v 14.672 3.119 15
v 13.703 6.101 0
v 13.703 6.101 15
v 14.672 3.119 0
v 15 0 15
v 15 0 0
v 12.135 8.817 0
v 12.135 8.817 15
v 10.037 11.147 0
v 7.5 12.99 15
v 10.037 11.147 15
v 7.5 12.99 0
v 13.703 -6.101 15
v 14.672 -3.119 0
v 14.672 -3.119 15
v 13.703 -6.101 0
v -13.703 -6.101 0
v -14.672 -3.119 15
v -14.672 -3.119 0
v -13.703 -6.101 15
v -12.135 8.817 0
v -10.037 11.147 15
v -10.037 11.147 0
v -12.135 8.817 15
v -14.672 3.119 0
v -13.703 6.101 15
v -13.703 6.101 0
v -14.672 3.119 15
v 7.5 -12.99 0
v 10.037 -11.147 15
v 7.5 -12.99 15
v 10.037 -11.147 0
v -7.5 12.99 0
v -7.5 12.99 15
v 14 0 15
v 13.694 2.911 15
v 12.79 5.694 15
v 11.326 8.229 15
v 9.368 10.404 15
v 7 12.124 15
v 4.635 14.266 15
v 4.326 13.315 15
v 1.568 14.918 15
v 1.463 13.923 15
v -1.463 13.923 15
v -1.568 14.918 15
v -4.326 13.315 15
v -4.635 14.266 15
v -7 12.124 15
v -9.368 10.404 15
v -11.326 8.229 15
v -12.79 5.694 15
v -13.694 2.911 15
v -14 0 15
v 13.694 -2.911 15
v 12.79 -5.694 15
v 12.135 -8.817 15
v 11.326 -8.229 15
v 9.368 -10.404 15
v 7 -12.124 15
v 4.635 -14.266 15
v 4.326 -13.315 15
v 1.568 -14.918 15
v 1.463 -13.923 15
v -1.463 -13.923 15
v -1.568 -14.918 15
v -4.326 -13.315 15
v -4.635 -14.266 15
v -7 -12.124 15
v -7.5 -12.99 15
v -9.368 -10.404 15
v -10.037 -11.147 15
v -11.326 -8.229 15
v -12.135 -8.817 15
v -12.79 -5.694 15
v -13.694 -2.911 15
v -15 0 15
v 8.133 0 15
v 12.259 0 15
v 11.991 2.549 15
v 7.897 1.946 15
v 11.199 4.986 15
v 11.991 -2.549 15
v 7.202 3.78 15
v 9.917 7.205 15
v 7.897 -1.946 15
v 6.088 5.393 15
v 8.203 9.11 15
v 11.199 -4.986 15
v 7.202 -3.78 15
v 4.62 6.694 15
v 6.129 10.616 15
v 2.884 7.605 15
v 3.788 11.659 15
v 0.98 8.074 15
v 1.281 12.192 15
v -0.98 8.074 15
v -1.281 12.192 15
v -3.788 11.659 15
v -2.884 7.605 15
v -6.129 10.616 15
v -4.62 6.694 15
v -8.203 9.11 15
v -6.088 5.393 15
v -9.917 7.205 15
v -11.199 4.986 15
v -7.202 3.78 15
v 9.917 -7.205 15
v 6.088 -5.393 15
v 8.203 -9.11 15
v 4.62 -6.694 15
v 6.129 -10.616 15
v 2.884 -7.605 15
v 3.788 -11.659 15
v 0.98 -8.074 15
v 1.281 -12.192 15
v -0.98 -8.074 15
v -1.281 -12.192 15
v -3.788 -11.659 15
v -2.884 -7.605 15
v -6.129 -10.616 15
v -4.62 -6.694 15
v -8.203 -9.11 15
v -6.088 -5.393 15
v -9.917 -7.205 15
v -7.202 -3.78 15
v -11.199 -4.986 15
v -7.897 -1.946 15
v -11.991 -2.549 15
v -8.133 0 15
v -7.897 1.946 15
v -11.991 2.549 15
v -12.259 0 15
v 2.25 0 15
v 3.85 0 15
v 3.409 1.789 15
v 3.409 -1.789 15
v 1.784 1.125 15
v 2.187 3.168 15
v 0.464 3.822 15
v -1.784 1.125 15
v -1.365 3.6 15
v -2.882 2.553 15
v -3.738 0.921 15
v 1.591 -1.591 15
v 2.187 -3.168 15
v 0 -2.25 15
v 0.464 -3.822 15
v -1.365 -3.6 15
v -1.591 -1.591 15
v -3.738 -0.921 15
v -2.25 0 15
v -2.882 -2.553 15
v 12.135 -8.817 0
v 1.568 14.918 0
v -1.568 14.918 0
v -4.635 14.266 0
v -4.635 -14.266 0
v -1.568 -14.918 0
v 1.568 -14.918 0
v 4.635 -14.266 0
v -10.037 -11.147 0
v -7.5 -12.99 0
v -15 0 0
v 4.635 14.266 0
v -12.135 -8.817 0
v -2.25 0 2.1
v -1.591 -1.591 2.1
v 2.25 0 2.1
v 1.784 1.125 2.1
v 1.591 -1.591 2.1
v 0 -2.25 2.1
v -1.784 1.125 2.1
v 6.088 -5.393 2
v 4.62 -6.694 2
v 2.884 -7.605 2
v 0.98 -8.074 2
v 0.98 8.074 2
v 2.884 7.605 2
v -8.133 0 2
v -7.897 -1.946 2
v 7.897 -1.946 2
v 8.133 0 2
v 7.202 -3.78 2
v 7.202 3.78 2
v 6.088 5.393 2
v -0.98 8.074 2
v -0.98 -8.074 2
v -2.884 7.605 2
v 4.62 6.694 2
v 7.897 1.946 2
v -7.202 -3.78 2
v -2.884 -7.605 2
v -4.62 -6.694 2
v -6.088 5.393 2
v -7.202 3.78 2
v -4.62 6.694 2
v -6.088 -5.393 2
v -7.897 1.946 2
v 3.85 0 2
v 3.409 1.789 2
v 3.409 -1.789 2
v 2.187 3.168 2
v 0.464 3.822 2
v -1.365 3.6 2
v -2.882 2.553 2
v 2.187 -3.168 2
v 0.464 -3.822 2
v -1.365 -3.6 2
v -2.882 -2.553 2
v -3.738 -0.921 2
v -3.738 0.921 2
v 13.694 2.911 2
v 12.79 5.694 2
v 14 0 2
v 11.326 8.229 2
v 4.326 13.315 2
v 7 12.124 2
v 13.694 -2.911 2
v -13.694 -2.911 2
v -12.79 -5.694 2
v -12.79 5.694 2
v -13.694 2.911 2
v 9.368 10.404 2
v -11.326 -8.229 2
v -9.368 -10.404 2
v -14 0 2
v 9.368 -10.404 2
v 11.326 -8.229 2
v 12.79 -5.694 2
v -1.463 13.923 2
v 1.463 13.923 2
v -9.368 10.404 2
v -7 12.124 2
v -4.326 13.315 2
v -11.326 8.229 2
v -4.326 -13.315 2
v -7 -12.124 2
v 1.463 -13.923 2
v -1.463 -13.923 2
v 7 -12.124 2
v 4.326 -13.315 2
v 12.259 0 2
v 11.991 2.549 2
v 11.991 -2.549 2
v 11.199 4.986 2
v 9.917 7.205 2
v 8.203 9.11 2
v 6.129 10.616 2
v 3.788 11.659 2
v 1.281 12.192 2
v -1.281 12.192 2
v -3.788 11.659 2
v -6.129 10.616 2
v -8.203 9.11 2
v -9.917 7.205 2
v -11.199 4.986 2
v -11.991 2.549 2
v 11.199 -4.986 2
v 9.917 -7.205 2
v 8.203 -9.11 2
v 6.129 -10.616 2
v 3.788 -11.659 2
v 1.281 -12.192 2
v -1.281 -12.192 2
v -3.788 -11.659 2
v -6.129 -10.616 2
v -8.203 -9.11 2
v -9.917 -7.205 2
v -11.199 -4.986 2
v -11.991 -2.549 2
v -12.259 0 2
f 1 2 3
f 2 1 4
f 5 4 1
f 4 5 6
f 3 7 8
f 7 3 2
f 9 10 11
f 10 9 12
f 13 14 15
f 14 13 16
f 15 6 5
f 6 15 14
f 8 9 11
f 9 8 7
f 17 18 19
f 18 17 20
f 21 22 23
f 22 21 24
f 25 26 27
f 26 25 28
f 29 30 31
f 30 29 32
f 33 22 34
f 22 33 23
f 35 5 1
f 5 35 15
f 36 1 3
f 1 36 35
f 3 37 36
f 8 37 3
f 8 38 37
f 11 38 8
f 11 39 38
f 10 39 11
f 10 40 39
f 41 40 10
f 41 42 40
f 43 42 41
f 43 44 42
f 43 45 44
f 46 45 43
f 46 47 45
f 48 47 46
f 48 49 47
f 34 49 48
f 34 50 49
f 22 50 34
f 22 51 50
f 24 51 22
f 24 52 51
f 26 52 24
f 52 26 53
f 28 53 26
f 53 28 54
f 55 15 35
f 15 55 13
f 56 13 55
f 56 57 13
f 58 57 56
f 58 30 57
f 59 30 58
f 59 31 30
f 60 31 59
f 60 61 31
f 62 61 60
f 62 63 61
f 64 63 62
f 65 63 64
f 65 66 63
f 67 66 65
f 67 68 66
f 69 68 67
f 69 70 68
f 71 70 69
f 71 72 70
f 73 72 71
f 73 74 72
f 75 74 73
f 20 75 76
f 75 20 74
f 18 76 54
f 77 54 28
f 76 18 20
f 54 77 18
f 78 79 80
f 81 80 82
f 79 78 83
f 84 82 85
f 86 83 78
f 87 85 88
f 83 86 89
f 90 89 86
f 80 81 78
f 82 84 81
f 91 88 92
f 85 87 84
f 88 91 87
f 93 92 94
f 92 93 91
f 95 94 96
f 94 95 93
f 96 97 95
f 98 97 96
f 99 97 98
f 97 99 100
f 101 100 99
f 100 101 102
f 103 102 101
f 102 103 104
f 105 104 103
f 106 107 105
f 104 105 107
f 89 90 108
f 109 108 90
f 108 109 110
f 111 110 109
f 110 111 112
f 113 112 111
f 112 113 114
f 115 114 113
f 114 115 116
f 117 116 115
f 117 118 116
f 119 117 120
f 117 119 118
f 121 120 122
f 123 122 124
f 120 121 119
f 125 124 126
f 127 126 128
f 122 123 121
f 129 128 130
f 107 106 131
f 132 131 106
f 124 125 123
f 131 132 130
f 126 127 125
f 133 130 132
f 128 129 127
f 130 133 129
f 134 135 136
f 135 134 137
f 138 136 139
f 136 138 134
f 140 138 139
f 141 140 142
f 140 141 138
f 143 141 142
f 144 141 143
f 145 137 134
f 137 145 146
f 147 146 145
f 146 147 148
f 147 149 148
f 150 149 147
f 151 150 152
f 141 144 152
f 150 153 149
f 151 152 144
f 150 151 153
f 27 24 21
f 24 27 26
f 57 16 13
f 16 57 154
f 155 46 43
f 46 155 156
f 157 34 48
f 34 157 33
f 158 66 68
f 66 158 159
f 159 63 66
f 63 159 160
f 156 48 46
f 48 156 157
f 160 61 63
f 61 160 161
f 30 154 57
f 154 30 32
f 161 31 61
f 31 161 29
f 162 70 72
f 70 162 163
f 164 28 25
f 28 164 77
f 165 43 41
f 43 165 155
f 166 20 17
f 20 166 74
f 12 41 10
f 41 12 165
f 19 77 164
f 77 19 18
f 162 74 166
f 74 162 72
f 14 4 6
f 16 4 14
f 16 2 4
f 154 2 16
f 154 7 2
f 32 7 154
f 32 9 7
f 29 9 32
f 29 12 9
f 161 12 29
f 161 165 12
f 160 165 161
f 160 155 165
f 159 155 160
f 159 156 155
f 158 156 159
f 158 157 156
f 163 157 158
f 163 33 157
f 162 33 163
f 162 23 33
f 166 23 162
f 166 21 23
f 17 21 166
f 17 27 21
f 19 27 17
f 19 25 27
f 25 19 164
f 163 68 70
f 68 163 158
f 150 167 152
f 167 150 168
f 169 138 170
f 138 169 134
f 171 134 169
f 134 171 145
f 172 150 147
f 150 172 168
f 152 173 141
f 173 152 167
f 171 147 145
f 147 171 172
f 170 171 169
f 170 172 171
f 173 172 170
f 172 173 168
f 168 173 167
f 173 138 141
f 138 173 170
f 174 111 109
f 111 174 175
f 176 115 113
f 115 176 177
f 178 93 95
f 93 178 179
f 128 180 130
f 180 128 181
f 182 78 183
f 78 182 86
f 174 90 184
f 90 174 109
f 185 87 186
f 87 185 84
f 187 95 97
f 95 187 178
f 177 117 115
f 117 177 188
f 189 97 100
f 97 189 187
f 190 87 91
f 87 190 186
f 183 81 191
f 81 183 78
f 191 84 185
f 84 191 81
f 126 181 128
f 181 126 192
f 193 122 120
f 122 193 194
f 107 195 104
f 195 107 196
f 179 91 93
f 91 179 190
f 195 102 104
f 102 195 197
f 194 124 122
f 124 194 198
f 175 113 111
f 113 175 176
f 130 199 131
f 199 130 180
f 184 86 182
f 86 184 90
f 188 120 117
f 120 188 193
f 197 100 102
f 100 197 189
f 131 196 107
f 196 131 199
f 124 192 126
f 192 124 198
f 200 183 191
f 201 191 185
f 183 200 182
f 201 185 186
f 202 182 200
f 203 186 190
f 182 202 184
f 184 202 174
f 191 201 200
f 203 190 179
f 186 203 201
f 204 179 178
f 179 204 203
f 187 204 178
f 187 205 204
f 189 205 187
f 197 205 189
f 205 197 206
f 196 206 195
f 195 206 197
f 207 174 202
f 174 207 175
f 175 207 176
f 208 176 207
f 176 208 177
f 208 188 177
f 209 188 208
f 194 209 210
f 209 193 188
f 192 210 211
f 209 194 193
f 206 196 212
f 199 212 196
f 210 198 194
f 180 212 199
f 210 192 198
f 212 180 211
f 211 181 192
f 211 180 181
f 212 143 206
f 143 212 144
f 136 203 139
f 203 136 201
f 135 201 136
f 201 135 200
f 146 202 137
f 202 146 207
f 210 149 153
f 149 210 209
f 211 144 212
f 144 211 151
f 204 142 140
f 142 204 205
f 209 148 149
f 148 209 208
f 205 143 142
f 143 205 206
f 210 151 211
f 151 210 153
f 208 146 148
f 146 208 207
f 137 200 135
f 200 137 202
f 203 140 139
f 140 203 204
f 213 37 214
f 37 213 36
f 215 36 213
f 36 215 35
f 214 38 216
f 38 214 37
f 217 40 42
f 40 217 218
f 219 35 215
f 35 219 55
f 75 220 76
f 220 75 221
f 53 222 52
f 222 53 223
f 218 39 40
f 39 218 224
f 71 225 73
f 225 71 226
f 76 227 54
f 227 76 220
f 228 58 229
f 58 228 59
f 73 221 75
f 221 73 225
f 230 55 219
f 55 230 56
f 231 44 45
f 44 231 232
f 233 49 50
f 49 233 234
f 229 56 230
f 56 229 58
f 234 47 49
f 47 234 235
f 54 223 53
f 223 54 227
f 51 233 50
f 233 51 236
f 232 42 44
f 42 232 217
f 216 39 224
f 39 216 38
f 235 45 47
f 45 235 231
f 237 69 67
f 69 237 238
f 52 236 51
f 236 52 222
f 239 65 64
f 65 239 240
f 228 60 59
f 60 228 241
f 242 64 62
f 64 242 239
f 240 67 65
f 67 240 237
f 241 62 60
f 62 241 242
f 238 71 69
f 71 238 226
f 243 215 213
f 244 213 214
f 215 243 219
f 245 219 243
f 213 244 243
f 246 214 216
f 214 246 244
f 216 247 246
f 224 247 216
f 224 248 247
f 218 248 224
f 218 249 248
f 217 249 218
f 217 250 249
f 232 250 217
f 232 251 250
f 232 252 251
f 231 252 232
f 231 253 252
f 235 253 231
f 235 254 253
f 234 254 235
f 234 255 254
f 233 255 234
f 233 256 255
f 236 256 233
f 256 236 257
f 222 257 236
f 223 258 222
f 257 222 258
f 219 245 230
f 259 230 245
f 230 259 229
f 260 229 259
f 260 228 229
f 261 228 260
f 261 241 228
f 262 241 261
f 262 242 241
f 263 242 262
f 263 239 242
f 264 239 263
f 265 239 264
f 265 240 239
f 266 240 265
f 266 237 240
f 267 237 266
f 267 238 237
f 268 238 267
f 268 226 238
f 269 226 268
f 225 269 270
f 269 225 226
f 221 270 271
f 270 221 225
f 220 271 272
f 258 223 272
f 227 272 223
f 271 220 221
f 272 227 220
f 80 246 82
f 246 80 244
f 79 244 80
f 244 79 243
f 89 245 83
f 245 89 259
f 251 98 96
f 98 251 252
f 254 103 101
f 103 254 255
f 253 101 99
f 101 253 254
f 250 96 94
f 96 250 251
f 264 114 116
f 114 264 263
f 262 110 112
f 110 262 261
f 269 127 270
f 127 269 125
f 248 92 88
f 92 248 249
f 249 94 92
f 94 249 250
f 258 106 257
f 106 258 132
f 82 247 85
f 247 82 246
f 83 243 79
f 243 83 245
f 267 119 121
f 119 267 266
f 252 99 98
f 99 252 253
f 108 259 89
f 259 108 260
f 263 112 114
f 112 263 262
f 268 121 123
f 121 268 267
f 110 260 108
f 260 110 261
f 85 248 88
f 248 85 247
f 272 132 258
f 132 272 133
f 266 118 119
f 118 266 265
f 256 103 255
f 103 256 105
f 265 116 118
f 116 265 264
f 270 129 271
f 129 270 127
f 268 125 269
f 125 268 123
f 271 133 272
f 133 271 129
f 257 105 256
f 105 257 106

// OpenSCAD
e = 0.1; // epsilon

// Screws / Nuts
// described by a 5-Element vector, offsets defined as follows
nut_diameter       = 0;
nut_height         = 1;
screw_channel      = 2;
screw_head_channel = 3;
screw_head_height  = 4;
m3 = [6.5, 2.5, 3.5, 6.0, 2.5];
m4 = [8.0, 3.5, 4.5, 7.5, 3.0];

// Nut embedding:
//
// dw: nut_diameter
// rw: nut radius
//                         +--+
//                         |  |
//                         |  |
//   X---------------------A  |-------
//                         |  |
//                         |  | rw
//                         B--C
//                         wh
// X: center of circle
// We want at least 1mm between nut and outer diameter, x
// We want the radius of the outer circle ro
// z = XB, ri = XA (inner radius), wh = BC (nut height)
// we have
// z² = (ri)² + (rw)²
// and approx.
// x = ro - z - wh
// solving for ro we get:
// ro = x + z + wh = x + sqrt (ri² + rw²) + wh
//

module knob_hollow (r1, r2, r3, r4, height, lift)
{
    translate ([0, 0, lift])
    {
        difference () {
            cylinder (h = height, r = r2);
            translate ([0, 0, -e])
                cylinder (h = height + 2 * e, r = r1);
        }
        if (r4 - r3 > 1) {
            difference () {
                cylinder (h = height, r = r4);
                translate ([0, 0, -e])
                    cylinder (h = height + 2 * e, r = r3);
            }
        }
    }
}

//module screw_hole ()
//{
//}

module knob_body (knob_dia, axis_dia, axis_carve, conic, depth, top)
{
    kr  = knob_dia / 2;
    ar  = axis_dia / 2;
    union () {
        difference () {
            cylinder (h = depth, r = kr);
            translate ([0, 0, top + e])
                cylinder (h = depth - top, r = ar);
        }
        translate ([0, (1-axis_carve) * axis_dia, depth / 2])
            cube ([axis_dia, axis_dia, depth], center = true);
    }
}

module knob (knob_dia, axis_dia, axis_carve, conic, depth, nut)
{
    top     = 2;
    wr      = nut [nut_diameter] / 2;
    wh      = nut [nut_height];
    r_i     = (axis_dia + 3.2) / 2;
    inner_r = sqrt (pow (wr, 2) + pow (wh + r_i, 2)) + 1;
    outer_r = 1 + sqrt (pow (inner_r, 2) + pow (wr, 2)) + wh;
    r_o     = (knob_dia - 2) / 2;

    difference () {
        knob_body   (knob_dia, axis_dia, axis_carve, conic, depth, top);
        knob_hollow (r_i, inner_r, outer_r, r_o, depth, top);
    }
}

knob(30, 4.5, 0.25, 0, 15, m3);
